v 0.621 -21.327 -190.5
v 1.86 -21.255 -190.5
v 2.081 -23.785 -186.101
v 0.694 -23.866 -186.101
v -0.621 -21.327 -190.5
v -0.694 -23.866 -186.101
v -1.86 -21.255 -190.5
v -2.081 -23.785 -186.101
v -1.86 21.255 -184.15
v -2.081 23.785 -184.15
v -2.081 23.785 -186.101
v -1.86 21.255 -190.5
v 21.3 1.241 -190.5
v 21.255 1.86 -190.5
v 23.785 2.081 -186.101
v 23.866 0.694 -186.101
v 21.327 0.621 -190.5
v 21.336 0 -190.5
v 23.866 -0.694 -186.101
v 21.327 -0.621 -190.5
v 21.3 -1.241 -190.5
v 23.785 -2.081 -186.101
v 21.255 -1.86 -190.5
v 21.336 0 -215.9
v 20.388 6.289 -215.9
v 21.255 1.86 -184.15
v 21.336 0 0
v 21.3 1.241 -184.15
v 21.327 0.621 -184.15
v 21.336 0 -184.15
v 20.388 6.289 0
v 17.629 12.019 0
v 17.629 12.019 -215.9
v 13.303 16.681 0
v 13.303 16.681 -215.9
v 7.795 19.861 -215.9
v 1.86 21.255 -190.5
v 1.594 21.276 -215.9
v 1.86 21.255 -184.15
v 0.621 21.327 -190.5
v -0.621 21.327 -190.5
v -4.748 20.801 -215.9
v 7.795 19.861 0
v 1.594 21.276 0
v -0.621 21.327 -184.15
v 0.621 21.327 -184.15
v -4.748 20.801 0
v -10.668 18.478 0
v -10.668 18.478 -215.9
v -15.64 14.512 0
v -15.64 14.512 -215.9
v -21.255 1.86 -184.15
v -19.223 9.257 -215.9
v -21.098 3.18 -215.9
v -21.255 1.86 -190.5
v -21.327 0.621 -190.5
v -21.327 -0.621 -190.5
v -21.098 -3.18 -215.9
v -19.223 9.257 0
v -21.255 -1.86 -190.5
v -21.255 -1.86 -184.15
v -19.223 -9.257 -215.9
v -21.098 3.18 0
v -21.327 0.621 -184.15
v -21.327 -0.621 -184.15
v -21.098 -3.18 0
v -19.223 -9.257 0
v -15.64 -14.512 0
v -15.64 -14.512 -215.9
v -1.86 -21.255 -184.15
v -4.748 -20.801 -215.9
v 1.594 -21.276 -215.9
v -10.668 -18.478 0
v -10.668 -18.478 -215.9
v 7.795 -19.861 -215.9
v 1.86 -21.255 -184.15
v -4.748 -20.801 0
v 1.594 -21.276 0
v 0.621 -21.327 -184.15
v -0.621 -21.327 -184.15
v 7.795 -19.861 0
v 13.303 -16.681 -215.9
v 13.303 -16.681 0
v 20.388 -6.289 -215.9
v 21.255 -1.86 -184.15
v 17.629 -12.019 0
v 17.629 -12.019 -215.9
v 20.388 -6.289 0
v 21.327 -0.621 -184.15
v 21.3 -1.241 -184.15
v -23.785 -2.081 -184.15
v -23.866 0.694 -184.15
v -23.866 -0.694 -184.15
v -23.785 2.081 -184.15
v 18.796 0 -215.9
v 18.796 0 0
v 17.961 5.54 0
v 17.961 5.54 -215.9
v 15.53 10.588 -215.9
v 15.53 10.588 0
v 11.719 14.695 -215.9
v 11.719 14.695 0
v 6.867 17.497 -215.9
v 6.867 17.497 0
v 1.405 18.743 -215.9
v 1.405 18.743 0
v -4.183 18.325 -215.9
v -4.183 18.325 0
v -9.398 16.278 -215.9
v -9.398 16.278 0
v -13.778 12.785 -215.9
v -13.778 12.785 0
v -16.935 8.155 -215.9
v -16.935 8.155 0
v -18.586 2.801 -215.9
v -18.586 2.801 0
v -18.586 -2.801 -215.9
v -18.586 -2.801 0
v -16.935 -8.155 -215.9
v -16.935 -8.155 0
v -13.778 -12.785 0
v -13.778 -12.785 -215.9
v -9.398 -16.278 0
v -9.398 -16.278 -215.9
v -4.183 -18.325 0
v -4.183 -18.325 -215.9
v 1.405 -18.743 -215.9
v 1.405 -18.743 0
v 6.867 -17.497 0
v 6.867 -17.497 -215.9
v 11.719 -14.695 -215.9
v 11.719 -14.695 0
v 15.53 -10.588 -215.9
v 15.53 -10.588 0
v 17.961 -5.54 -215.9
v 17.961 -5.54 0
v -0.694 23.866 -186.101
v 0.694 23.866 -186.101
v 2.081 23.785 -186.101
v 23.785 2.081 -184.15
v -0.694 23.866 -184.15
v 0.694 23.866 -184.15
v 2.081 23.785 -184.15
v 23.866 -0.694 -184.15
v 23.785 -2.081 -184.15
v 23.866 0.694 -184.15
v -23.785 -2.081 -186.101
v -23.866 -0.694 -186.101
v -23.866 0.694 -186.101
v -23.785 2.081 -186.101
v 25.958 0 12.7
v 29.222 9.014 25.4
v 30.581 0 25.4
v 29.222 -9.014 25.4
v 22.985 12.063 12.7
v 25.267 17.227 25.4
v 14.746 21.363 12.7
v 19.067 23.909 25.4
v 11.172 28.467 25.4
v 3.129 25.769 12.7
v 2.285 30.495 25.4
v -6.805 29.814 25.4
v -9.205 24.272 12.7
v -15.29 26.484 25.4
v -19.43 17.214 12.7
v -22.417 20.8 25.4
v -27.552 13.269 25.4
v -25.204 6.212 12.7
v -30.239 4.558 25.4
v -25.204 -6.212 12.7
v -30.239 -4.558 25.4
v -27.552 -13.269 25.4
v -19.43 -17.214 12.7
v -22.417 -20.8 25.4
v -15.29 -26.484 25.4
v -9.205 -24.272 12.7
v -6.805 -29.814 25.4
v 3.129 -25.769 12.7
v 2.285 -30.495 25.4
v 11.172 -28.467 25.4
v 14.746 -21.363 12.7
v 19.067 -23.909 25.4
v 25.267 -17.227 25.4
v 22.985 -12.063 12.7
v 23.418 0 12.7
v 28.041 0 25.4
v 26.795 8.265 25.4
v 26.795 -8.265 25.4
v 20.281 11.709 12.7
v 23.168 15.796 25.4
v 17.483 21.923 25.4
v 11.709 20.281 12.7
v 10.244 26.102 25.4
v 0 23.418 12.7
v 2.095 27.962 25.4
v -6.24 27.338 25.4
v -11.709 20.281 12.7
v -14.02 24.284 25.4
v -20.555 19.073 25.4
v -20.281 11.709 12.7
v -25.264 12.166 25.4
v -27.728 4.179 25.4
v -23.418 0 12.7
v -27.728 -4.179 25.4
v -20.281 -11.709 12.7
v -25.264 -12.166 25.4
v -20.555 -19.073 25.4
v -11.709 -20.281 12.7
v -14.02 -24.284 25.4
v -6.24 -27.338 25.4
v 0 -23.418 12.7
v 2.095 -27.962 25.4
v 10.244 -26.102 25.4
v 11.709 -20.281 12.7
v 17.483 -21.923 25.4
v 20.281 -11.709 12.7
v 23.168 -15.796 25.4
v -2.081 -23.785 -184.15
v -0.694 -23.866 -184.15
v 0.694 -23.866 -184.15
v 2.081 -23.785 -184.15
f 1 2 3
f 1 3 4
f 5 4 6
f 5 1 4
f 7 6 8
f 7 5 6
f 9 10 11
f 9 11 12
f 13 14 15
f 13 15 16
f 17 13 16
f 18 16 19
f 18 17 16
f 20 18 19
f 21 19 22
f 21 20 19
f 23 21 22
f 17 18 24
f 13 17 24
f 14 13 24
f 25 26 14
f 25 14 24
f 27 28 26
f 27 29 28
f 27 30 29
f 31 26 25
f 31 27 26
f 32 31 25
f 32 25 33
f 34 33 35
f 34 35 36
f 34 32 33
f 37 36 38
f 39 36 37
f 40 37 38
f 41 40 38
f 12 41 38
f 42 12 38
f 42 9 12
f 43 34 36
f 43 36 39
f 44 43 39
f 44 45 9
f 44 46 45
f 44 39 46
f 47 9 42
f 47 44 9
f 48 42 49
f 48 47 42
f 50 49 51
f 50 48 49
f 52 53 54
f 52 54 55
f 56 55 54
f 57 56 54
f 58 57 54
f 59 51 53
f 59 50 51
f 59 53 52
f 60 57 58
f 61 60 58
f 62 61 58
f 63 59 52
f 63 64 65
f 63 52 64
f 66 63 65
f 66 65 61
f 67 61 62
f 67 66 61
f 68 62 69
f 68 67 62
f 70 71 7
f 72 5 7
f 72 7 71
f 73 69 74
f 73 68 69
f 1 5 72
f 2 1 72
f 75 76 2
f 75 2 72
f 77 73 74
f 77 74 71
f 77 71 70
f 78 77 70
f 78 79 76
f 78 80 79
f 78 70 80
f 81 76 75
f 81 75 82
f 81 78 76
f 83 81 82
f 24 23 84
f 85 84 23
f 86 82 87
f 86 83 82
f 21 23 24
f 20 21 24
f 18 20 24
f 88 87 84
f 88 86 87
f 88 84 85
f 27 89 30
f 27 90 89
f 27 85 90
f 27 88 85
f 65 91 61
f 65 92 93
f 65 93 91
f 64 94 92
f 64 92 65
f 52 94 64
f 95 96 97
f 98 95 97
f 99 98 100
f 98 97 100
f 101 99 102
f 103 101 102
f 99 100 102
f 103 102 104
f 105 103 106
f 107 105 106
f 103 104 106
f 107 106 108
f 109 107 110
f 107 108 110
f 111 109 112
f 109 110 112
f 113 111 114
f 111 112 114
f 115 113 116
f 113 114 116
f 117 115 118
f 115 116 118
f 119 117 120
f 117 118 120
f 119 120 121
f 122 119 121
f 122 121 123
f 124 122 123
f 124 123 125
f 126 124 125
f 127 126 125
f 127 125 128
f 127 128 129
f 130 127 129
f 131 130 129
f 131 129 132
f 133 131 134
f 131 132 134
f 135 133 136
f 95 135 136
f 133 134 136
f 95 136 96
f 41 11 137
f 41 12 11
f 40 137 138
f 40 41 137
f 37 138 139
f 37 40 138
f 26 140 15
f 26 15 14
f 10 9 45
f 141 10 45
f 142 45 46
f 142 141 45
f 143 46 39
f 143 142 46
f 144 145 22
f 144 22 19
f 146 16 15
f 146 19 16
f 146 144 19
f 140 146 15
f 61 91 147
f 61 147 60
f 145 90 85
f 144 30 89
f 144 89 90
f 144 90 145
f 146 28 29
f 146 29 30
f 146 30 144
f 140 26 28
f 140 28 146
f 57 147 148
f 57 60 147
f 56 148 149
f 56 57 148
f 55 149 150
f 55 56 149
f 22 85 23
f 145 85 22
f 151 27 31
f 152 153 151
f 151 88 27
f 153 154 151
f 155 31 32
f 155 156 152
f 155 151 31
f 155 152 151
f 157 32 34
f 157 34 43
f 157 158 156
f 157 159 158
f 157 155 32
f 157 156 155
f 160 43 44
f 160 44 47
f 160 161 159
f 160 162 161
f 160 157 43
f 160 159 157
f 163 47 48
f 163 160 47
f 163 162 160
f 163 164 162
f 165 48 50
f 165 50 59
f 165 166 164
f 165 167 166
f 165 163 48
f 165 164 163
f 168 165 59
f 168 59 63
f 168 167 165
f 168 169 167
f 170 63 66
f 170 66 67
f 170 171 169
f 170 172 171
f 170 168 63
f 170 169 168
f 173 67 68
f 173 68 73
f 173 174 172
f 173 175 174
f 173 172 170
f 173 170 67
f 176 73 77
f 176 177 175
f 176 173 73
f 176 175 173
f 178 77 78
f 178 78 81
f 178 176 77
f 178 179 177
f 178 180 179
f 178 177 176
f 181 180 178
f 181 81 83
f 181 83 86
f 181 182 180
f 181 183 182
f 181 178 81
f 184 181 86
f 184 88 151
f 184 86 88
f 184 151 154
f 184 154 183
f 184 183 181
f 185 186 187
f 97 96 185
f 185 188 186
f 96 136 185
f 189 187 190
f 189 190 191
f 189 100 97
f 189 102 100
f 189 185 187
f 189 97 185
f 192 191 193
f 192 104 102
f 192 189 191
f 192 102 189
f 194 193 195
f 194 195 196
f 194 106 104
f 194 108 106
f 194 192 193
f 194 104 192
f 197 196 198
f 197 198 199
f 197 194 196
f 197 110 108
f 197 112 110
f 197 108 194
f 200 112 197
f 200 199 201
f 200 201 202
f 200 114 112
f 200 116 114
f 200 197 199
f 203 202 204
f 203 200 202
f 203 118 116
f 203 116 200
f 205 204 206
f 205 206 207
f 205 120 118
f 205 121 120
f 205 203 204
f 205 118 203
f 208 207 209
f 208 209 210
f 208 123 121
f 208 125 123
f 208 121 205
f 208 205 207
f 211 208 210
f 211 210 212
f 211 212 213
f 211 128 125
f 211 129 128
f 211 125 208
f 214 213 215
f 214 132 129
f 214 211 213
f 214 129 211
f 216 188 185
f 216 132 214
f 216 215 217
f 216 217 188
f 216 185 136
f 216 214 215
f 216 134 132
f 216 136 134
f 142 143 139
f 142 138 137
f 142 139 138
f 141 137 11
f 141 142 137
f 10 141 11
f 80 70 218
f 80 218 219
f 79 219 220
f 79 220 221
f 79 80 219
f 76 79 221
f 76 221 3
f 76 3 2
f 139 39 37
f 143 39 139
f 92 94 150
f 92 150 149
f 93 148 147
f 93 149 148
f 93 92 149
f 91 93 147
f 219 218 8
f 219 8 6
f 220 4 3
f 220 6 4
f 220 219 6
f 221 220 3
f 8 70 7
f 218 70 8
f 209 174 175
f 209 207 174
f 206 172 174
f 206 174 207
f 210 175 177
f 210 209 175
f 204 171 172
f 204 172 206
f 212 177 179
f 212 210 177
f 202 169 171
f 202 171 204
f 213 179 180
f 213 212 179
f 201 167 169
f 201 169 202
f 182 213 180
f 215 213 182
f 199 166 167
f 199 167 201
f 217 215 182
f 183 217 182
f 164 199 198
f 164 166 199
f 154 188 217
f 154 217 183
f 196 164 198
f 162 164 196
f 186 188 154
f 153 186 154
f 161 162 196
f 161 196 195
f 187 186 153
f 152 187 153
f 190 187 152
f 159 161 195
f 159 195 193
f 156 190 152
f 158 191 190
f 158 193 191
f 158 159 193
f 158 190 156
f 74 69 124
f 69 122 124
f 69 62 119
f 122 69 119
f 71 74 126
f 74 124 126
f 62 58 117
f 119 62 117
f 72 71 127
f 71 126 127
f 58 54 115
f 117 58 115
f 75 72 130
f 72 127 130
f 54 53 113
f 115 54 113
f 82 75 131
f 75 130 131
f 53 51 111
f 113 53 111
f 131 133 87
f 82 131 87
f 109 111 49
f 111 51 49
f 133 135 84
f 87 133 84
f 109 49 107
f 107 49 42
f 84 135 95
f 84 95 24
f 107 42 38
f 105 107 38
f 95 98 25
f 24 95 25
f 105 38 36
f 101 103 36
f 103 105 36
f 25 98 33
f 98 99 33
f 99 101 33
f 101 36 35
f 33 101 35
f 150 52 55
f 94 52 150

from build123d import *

# Parameters (mm, degrees)
F0_R     = 21.336
F0_R_2   = 18.796
F1_DEPTH = 215.9
F5_START = -184.15
F5_DEPTH = 6.35


with BuildPart() as f1:
    # F0 (on Top) → F1 (new body)
    with BuildSketch(Plane.XY):
        Circle(F0_R)
        Circle(F0_R_2, mode=Mode.SUBTRACT)
    extrude(amount=-F1_DEPTH)

    # F2 (on Front) → F3 (revolve)
    with BuildSketch(Plane.XZ):
        Polygon((18.796, 0), (21.336, 0), (30.5808439504, 25.4), (28.0408439504, 25.4), align=None)
    revolve(axis=Axis((0, 0, 12.7485655248), (0, 0, 1)))

    # F4 (on Top) → F5 (join)
    with BuildSketch(Plane.XY.offset(F5_START)):
        with BuildLine():
            Line((-23.7851446116, -2.0809305138), (-21.2548100785, -1.8595549273))
            ThreePointArc((-21.2548100785, -1.8595549273), (-21.336, 0), (-21.2548100785, 1.8595549273))
            Line((-21.2548100785, 1.8595549273), (-23.7851446116, 2.0809305138))
            ThreePointArc((-23.7851446116, 2.0809305138), (-23.876, 0), (-23.7851446116, -2.0809305138))
        make_face()
        with BuildLine():
            Line((-2.0809305138, 23.7851446116), (-1.8595549273, 21.2548100785))
            ThreePointArc((-1.8595549273, 21.2548100785), (0, 21.336), (1.8595549273, 21.2548100785))
            Line((1.8595549273, 21.2548100785), (2.0809305138, 23.7851446116))
            ThreePointArc((2.0809305138, 23.7851446116), (0, 23.876), (-2.0809305138, 23.7851446116))
        make_face()
        with BuildLine():
            Line((23.7851446116, 2.0809305138), (21.2548100785, 1.8595549273))
            ThreePointArc((21.2548100785, 1.8595549273), (21.336, 0), (21.2548100785, -1.8595549273))
            Line((21.2548100785, -1.8595549273), (23.7851446116, -2.0809305138))
            ThreePointArc((23.7851446116, -2.0809305138), (23.876, 0), (23.7851446116, 2.0809305138))
        make_face()
        with BuildLine():
            Line((2.0809305138, -23.7851446116), (1.8595549273, -21.2548100785))
            ThreePointArc((1.8595549273, -21.2548100785), (0, -21.336), (-1.8595549273, -21.2548100785))
            Line((-1.8595549273, -21.2548100785), (-2.0809305138, -23.7851446116))
            ThreePointArc((-2.0809305138, -23.7851446116), (0, -23.876), (2.0809305138, -23.7851446116))
        make_face()
    extrude(amount=-F5_DEPTH)

    # F6 (on Front) → F7 (revolve, cut)
    with BuildSketch(Plane.XZ):
        Polygon((23.876, -186.1005909488), (21.336, -190.5), (23.876, -190.5), align=None)
    revolve(axis=Axis((0, 0, -83.1778421998), (0, 0, -1)), mode=Mode.SUBTRACT)


solid = f1.part
